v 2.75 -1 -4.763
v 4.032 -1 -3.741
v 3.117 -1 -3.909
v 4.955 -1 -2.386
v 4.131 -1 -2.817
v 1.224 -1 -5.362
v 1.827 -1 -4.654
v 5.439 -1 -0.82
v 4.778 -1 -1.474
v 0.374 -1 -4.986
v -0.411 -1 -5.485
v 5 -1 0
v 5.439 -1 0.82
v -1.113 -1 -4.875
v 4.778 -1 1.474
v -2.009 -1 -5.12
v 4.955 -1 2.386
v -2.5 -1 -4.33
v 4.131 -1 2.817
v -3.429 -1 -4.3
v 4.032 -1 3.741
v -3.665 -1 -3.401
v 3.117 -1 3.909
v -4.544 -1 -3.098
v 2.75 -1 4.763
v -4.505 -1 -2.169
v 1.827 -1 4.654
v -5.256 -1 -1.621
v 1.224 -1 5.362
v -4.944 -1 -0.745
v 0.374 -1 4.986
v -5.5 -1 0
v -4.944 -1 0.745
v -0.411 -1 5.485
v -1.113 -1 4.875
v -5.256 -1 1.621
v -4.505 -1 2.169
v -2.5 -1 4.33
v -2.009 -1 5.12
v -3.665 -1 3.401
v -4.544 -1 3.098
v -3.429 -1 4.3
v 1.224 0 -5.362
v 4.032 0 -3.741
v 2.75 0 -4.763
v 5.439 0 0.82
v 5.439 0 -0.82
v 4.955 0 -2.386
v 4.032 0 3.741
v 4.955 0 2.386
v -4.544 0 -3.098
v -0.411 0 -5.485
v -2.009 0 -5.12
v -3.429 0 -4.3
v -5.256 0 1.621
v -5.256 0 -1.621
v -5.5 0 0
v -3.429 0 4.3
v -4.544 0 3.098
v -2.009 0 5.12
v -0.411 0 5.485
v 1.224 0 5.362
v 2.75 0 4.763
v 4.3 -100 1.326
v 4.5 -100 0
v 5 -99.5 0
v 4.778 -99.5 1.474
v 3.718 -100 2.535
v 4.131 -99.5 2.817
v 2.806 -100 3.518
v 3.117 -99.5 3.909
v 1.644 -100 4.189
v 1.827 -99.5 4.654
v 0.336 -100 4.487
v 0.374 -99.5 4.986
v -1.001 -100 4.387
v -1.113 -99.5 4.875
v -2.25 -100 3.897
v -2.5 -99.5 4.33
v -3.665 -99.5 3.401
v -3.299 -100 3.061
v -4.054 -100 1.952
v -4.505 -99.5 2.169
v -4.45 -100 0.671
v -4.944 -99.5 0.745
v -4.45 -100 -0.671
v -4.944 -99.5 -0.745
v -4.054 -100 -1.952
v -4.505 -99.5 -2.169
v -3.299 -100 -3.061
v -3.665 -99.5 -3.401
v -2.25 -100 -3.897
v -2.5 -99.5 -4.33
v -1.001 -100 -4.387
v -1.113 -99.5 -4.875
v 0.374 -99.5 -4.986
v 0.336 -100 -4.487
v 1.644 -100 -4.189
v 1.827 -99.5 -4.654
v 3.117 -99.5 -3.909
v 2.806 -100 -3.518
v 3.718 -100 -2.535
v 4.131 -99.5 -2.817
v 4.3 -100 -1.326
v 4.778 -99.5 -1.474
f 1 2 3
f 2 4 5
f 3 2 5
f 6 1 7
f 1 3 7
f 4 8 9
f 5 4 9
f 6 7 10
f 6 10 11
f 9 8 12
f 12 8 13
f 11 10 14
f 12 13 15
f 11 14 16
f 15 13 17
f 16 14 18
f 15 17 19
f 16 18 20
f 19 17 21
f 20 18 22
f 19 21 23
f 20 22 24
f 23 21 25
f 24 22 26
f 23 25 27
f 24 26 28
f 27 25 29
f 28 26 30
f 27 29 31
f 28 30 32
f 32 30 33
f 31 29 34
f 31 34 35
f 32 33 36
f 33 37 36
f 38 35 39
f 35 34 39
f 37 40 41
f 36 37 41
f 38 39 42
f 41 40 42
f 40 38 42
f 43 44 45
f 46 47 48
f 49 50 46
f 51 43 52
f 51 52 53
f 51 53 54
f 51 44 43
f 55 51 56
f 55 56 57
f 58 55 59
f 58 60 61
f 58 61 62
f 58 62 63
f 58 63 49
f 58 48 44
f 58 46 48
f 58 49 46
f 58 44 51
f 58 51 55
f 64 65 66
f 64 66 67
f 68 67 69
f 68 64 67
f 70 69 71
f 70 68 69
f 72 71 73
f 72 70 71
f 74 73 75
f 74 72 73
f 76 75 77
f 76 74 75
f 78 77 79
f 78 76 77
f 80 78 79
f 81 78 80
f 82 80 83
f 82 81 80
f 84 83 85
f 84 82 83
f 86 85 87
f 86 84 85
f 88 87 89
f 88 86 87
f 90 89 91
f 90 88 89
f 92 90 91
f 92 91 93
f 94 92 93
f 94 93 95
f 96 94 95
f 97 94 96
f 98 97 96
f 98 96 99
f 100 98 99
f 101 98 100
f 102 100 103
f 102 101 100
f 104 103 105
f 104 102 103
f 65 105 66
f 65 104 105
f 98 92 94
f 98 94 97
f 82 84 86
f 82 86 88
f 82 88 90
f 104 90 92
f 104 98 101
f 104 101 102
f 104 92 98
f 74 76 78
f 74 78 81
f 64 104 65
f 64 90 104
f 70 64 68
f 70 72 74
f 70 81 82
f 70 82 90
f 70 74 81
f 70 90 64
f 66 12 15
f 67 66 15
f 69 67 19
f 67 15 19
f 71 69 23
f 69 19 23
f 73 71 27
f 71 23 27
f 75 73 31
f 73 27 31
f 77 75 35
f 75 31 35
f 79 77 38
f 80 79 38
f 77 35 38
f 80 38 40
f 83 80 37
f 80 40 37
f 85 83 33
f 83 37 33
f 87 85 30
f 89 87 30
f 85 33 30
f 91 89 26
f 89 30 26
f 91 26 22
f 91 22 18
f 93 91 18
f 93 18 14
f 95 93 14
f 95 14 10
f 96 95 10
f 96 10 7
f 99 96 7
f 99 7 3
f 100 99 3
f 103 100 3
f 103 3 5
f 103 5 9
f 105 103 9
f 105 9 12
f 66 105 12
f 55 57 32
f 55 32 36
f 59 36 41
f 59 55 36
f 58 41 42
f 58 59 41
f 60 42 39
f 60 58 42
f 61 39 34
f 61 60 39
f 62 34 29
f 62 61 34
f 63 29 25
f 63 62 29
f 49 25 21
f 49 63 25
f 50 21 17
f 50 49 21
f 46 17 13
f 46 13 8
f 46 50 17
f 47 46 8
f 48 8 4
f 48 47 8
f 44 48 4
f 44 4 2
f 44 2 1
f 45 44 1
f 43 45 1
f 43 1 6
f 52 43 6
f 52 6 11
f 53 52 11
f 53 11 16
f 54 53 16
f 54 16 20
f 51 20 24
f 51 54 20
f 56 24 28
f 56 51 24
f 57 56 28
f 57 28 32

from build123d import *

# Parameters (mm, degrees)
F0_R     = 5
F1_DEPTH = 100
F2_SIZE  = 0.5
F3_R     = 5.5
F4_DEPTH = 1


with BuildPart() as f1:
    # F0 (on Front) → F1 (new body)
    with BuildSketch(Plane.XZ):
        Circle(F0_R)
    extrude(amount=F1_DEPTH)

    # F2
    f2_edges = [f1.edges().sort_by_distance(p)[0] for p in [
        (-5, -100, 0),
    ]]
    chamfer(f2_edges, length=F2_SIZE)

    # F3 (on face) → F4 (join)
    with BuildSketch(Plane(origin=(0, 0, 0), x_dir=(-1, 0, 0), z_dir=(0, 1, 0))):
        Circle(F3_R)
    extrude(amount=-F4_DEPTH)


solid = f1.part
